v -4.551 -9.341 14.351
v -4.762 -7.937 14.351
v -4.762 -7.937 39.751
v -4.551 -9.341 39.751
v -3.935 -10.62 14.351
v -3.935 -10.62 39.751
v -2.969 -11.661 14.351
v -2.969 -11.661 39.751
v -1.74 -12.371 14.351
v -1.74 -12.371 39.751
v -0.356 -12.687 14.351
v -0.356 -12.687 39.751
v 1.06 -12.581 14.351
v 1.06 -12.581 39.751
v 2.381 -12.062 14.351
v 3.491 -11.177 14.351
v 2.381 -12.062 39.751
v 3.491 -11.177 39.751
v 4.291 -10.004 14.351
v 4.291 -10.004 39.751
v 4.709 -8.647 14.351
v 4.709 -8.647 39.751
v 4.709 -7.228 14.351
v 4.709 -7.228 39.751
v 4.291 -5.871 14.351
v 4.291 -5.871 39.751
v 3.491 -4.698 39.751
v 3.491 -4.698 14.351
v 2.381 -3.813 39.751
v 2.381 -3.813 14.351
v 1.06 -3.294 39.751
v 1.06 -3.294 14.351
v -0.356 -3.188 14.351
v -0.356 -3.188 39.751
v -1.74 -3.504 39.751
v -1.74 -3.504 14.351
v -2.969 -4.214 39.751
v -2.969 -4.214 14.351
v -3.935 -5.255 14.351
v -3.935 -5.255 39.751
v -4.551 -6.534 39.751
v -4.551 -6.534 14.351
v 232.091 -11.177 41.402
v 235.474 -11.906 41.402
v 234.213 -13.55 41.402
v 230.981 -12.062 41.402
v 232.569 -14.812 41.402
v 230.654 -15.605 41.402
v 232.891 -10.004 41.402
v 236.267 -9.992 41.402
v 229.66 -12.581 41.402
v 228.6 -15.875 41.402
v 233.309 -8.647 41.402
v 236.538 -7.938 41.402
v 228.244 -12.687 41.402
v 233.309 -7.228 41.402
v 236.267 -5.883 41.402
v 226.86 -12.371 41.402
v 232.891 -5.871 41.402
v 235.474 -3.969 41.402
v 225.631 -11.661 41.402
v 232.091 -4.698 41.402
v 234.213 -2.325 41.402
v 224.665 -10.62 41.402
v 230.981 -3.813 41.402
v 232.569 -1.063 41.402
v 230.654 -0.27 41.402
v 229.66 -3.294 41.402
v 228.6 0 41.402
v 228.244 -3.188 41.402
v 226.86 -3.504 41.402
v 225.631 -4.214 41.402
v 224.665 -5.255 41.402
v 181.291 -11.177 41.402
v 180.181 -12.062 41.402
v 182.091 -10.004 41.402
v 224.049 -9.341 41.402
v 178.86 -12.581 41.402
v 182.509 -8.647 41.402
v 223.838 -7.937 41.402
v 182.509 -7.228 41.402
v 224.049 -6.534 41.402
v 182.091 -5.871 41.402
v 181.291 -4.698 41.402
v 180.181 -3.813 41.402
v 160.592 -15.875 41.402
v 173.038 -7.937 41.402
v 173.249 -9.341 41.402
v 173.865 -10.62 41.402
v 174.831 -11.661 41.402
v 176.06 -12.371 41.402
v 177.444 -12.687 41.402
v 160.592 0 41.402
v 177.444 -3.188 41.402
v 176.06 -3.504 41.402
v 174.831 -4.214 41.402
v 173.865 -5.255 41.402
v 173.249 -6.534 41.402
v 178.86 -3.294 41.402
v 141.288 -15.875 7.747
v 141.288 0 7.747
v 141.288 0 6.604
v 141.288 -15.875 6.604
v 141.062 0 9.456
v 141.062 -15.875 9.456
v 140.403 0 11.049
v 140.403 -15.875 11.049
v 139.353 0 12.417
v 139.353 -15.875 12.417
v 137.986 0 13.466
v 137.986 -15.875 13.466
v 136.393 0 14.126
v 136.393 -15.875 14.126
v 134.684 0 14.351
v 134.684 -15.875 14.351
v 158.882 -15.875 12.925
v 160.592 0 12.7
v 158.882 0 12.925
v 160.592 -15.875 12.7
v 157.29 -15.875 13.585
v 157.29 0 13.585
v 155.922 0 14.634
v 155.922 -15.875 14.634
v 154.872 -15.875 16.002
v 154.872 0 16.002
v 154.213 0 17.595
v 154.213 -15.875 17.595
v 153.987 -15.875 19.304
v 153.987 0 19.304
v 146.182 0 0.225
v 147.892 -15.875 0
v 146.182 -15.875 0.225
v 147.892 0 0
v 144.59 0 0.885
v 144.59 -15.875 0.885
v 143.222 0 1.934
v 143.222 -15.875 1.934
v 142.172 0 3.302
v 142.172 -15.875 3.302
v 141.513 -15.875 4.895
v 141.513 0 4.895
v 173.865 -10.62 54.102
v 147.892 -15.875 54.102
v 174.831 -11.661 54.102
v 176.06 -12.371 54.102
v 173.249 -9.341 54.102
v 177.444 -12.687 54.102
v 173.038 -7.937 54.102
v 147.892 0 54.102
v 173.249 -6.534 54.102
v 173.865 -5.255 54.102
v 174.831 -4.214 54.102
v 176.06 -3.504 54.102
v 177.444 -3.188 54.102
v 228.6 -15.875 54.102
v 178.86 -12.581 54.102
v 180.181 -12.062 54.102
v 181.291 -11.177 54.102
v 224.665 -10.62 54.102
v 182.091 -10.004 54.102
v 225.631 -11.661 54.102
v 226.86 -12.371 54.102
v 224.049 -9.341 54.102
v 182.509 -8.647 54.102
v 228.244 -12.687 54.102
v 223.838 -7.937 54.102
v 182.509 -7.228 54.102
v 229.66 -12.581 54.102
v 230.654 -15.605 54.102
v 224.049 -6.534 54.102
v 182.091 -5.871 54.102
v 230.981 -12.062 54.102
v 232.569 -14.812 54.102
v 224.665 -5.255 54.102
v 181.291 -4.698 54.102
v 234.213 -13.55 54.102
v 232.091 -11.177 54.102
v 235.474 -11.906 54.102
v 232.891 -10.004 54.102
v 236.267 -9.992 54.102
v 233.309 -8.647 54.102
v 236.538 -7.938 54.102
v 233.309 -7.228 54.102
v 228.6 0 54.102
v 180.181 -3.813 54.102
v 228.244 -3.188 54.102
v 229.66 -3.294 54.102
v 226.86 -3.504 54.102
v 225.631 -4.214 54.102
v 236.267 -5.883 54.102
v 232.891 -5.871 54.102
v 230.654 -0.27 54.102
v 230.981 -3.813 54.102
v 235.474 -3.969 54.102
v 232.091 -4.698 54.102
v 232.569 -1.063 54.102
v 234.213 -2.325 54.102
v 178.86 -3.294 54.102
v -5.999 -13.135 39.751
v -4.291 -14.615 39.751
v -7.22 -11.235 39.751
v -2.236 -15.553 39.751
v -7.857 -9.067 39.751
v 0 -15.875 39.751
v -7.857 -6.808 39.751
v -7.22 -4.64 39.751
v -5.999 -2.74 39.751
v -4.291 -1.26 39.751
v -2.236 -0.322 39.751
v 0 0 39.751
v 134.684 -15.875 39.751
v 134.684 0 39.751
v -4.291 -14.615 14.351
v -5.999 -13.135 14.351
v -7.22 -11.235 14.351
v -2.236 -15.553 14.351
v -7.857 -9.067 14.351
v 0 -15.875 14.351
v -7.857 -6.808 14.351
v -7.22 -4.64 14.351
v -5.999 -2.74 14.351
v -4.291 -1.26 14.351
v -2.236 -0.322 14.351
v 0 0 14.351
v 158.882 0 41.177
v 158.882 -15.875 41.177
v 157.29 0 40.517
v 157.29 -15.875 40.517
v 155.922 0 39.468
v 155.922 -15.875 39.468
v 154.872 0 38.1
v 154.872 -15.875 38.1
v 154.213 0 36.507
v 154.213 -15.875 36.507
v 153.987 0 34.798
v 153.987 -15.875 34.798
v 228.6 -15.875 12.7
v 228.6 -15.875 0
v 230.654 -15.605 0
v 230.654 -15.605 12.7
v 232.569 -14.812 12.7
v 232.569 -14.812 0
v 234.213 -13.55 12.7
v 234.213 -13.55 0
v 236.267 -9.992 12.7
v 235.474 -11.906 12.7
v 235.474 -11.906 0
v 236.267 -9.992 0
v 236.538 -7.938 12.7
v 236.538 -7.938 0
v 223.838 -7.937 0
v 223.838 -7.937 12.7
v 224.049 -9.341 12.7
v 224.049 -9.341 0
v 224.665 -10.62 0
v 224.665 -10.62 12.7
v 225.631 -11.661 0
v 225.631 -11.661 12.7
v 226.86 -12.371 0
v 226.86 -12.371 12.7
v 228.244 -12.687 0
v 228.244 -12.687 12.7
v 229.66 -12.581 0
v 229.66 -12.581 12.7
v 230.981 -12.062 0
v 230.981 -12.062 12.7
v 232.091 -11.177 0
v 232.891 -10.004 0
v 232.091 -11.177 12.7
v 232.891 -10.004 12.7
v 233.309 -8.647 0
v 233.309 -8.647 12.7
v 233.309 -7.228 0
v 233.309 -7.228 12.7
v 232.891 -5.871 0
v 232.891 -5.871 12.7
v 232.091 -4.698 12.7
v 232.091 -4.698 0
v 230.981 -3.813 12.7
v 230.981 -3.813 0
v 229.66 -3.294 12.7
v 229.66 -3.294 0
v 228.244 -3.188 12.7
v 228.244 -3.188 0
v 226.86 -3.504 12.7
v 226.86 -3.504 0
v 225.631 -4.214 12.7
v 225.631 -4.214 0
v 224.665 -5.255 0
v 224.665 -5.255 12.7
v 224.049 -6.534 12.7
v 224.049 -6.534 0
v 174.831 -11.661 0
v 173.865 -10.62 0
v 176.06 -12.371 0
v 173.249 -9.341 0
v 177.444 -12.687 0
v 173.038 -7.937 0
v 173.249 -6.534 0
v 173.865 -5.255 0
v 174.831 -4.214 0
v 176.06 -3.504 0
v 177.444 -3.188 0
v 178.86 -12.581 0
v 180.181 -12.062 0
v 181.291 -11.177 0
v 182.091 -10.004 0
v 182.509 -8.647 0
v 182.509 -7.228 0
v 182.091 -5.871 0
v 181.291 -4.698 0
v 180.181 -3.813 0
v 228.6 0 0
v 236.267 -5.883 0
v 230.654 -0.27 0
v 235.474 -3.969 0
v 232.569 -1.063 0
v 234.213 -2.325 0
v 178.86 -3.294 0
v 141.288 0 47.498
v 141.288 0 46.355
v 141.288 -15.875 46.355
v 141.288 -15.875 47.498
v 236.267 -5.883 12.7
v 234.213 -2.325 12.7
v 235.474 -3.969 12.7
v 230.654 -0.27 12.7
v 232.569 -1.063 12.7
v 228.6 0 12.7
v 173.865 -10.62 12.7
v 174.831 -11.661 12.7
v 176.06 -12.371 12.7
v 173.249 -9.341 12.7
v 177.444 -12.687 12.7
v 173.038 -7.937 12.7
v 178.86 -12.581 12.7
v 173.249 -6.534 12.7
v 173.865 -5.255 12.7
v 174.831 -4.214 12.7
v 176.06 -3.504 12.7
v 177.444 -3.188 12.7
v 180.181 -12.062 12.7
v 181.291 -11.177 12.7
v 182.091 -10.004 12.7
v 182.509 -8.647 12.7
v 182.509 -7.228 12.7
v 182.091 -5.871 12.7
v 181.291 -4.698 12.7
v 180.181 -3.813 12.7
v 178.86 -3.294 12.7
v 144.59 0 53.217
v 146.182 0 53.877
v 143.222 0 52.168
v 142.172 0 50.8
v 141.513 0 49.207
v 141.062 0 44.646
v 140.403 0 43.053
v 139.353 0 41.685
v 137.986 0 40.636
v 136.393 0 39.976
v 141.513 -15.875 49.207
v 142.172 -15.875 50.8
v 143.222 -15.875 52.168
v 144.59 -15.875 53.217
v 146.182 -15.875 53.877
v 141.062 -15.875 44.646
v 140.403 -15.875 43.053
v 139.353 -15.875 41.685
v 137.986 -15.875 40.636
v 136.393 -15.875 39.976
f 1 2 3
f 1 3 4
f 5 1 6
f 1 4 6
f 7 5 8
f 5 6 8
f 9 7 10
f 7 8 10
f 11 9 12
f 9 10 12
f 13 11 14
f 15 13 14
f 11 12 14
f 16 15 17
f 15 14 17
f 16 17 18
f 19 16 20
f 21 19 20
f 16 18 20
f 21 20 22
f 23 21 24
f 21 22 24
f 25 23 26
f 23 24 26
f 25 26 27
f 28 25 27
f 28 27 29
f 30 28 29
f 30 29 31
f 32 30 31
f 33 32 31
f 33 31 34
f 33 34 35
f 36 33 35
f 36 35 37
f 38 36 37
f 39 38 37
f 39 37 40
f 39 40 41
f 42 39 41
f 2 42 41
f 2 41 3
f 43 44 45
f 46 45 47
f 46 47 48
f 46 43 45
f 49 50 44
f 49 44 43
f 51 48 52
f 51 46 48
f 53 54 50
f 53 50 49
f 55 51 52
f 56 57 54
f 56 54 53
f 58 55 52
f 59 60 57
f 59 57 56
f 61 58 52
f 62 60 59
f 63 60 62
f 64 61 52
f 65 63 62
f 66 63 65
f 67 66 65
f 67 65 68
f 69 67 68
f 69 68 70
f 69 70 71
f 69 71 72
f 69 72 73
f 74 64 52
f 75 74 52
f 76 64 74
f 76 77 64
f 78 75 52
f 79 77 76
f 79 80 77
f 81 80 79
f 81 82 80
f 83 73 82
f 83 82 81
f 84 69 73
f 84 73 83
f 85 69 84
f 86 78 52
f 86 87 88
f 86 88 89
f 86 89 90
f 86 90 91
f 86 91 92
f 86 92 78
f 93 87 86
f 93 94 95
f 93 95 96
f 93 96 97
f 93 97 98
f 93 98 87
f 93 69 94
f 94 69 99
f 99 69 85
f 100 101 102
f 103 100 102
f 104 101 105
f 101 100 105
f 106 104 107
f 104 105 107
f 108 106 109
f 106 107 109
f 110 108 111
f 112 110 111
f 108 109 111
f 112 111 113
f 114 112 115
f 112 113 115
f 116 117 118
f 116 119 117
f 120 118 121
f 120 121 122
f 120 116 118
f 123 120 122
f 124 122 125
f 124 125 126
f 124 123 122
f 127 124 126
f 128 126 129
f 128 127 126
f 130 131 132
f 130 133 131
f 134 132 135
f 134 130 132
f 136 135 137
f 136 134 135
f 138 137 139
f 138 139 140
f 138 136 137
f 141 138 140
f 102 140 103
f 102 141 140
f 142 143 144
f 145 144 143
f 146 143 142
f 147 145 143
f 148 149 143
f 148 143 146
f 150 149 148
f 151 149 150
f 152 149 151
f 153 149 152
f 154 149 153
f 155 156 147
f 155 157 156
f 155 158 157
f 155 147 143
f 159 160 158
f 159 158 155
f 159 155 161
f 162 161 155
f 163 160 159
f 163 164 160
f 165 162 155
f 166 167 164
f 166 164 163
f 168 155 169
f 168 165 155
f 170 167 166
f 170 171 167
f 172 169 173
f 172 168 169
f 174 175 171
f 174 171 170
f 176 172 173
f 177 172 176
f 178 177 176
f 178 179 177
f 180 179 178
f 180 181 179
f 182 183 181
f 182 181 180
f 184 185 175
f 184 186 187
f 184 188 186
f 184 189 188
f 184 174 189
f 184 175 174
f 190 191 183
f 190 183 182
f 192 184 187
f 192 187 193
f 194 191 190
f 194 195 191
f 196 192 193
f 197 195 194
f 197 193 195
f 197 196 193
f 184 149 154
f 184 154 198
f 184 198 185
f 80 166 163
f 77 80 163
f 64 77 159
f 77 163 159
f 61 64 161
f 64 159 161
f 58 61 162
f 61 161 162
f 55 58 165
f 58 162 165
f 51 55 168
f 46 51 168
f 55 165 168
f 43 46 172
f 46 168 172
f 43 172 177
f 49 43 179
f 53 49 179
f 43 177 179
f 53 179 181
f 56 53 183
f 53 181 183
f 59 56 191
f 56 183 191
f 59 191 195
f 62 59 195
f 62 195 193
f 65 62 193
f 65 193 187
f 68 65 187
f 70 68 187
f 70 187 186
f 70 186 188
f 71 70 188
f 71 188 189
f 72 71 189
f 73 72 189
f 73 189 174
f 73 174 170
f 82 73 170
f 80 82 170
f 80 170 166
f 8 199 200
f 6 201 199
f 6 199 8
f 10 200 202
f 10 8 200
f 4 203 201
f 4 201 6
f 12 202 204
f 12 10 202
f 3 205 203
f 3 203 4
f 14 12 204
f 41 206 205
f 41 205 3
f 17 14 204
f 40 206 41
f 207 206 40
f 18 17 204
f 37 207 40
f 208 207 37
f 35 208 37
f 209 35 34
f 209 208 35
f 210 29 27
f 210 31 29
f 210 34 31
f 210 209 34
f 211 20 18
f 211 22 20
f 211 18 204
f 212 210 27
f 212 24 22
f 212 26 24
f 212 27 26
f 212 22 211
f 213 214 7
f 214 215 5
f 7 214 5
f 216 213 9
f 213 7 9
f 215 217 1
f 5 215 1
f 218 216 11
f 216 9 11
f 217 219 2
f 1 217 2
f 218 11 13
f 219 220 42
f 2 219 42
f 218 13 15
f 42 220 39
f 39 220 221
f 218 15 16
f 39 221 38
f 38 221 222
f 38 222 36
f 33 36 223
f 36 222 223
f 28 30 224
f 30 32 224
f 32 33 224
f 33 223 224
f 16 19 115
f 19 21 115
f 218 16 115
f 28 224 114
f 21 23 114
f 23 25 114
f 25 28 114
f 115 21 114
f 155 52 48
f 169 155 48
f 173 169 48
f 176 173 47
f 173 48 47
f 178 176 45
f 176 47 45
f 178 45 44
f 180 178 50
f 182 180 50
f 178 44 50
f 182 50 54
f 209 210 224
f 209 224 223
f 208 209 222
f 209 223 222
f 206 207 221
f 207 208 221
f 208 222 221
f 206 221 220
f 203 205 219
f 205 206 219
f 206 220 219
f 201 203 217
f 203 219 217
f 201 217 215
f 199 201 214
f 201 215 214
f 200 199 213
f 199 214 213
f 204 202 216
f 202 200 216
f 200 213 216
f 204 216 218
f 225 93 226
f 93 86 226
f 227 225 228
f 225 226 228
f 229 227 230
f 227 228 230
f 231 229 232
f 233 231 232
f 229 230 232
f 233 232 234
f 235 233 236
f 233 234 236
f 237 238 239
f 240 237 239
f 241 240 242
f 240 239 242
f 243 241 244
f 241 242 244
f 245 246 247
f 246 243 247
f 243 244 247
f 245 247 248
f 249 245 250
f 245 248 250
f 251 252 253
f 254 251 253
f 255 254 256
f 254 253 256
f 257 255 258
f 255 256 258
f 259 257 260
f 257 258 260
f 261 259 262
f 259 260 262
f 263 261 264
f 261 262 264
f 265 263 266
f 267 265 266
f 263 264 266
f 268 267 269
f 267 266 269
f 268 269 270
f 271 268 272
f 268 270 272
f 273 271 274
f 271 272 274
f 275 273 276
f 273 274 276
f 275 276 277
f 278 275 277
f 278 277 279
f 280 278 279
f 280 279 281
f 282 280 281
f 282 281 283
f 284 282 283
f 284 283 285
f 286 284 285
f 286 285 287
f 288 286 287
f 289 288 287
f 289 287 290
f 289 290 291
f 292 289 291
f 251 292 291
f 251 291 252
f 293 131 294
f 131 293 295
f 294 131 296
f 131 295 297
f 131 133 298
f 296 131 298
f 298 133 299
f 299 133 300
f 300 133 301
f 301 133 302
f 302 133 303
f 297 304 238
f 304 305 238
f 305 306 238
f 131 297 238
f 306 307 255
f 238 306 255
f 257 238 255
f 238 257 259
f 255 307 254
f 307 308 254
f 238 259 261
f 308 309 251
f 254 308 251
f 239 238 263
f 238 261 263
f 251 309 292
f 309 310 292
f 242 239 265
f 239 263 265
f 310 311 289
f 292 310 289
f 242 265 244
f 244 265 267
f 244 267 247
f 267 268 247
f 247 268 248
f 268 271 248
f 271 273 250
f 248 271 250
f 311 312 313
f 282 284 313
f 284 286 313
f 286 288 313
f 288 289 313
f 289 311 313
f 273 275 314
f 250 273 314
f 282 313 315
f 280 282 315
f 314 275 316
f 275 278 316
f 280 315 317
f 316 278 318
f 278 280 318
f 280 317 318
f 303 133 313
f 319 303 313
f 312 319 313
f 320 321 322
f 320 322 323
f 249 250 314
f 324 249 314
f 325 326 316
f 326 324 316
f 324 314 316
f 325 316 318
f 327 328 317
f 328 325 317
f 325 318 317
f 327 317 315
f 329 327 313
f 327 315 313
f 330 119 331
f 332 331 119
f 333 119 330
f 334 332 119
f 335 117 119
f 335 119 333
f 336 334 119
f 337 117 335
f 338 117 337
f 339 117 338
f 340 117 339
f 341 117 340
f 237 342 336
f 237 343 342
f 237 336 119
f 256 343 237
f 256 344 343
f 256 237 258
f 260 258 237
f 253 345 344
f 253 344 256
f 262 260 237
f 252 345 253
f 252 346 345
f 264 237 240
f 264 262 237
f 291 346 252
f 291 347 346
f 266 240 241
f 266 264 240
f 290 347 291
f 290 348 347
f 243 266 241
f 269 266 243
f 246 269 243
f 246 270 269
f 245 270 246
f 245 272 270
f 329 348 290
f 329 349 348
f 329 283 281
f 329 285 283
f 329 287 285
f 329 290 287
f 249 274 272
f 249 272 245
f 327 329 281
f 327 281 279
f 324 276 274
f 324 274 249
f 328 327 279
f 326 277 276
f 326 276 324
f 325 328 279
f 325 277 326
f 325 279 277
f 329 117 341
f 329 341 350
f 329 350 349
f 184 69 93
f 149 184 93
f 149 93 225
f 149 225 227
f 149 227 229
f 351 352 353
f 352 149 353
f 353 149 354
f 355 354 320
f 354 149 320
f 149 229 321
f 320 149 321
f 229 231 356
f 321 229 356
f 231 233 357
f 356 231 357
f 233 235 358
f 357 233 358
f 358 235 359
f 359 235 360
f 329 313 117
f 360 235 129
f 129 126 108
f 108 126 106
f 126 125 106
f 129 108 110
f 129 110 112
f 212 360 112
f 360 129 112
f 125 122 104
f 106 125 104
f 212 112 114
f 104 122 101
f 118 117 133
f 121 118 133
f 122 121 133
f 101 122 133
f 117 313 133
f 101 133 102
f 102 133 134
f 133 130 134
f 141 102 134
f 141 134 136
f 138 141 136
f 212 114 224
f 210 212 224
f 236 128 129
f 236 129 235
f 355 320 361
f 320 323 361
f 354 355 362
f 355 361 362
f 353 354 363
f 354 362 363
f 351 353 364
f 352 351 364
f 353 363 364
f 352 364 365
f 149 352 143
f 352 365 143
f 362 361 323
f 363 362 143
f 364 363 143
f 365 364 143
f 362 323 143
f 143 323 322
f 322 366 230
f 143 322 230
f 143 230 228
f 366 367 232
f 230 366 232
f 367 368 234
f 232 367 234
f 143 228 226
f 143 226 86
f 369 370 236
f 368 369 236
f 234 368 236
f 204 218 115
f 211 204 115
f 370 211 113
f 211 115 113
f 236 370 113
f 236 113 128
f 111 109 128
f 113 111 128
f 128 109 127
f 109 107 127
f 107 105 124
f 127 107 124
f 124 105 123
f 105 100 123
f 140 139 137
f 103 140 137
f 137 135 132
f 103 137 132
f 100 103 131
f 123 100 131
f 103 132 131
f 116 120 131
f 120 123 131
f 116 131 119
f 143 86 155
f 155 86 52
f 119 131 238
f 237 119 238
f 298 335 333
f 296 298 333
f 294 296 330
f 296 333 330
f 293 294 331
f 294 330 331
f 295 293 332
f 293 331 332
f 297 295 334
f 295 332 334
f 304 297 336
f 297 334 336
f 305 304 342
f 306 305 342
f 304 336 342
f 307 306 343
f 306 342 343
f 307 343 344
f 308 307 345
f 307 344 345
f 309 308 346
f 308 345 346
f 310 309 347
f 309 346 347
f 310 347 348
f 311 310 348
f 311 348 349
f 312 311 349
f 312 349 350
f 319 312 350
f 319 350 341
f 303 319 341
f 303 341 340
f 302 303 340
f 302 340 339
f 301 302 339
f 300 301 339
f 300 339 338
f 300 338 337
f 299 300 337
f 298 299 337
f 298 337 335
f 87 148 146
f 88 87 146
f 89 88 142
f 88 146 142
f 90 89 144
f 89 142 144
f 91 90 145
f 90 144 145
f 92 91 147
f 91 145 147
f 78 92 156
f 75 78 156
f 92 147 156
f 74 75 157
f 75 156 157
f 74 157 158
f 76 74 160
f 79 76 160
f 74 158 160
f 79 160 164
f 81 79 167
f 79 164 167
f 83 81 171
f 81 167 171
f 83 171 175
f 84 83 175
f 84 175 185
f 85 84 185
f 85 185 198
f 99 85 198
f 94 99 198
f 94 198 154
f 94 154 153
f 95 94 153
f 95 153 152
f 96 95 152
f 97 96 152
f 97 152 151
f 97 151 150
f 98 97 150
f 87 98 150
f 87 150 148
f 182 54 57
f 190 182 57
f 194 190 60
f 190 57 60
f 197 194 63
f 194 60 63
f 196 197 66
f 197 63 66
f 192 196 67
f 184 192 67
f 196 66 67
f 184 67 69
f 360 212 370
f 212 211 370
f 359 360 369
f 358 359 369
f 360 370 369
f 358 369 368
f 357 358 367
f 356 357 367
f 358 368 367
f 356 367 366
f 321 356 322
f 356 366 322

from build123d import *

# Parameters (mm, degrees)
F1_DEPTH = 54.102
F2_D     = 9.525
F3_W     = 74.6125
F3_H     = 28.702
F3_W_2   = 36.2260771513
F4_W     = 161.925
F4_H     = 27.051
F5_DEPTH = 25.4
F7_R     = 6.604


# Not quite as in the source:
# - a pattern or mirror of a feature is missing from the dataset's text; its kind, count and spacing are read off the source's solid


with BuildPart() as f1:
    # F0 (on Top) → F1 (new body)
    with BuildSketch(Plane.XY):
        with BuildLine():
            ThreePointArc((236.5375, -7.9375), (234.2126600757, -2.3248399243), (228.6, 0))
            Line((228.6, 0), (228.6, -15.875))
            ThreePointArc((228.6, -15.875), (234.2126600757, -13.5501600757), (236.5375, -7.9375))
        make_face()
        with BuildLine():
            Line((228.6, -15.875), (228.6, 0))
            ThreePointArc((228.6, 0), (220.6625, -7.9375), (228.6, -15.875))
        make_face()
        with BuildLine():
            Line((228.6, 0), (0, 0))
            ThreePointArc((0, 0), (5.6126600757, -2.3248399243), (7.9375, -7.9375))
            ThreePointArc((7.9375, -7.9375), (5.6126600757, -13.5501600757), (0, -15.875))
            Line((0, -15.875), (228.6, -15.875))
            ThreePointArc((228.6, -15.875), (220.6625, -7.9375), (228.6, 0))
        make_face()
        with BuildLine():
            ThreePointArc((7.9375, -7.9375), (5.6126600757, -2.3248399243), (0, 0))
            Line((0, 0), (0, -15.875))
            ThreePointArc((0, -15.875), (5.6126600757, -13.5501600757), (7.9375, -7.9375))
        make_face()
        with BuildLine():
            Line((0, -15.875), (0, 0))
            ThreePointArc((0, 0), (-7.9375, -7.9375), (0, -15.875))
        make_face()
    extrude(amount=F1_DEPTH)

    # F2 (through all)
    with Locations(Plane(origin=(0, 0, 0), x_dir=(1, 0, 0), z_dir=(0, 0, -1))):
        with Locations((0, 7.9375), (177.8, 7.9375), (228.6, 7.9375)):
            Hole(F2_D / 2)

    # F3 (on Front) + F4 (on Front) → F5 (cut)
    with BuildSketch(Plane.XZ):
        with Locations((191.29375, 27.051)):
            Rectangle(F3_W, F3_H)
        with Locations((246.7130385756, 27.051)):
            Rectangle(F3_W_2, F3_H)
    with BuildSketch(Plane.XZ):
        with Locations((60.325, 53.2765)):
            Rectangle(F4_W, F4_H)
    f5 = extrude(amount=F5_DEPTH, mode=Mode.SUBTRACT)

    # F5_copies: F5 across plane
    add(f5.mirror(Plane(origin=(0, 0, 27.051), x_dir=(-1, 0, 0), z_dir=(0, 0, -1))), mode=Mode.SUBTRACT)

    # F7
    f7_edges = [f1.edges().sort_by_distance(p)[0] for p in [
        (141.2875, -7.9375, 39.751),
        (141.2875, -7.9375, 54.102),
        (153.9875, -7.9375, 12.7),
        (153.9875, -7.9375, 41.402),
        (141.2875, -7.9375, 0),
        (141.2875, -7.9375, 14.351),
    ]]
    fillet(f7_edges, radius=F7_R)


solid = f1.part
